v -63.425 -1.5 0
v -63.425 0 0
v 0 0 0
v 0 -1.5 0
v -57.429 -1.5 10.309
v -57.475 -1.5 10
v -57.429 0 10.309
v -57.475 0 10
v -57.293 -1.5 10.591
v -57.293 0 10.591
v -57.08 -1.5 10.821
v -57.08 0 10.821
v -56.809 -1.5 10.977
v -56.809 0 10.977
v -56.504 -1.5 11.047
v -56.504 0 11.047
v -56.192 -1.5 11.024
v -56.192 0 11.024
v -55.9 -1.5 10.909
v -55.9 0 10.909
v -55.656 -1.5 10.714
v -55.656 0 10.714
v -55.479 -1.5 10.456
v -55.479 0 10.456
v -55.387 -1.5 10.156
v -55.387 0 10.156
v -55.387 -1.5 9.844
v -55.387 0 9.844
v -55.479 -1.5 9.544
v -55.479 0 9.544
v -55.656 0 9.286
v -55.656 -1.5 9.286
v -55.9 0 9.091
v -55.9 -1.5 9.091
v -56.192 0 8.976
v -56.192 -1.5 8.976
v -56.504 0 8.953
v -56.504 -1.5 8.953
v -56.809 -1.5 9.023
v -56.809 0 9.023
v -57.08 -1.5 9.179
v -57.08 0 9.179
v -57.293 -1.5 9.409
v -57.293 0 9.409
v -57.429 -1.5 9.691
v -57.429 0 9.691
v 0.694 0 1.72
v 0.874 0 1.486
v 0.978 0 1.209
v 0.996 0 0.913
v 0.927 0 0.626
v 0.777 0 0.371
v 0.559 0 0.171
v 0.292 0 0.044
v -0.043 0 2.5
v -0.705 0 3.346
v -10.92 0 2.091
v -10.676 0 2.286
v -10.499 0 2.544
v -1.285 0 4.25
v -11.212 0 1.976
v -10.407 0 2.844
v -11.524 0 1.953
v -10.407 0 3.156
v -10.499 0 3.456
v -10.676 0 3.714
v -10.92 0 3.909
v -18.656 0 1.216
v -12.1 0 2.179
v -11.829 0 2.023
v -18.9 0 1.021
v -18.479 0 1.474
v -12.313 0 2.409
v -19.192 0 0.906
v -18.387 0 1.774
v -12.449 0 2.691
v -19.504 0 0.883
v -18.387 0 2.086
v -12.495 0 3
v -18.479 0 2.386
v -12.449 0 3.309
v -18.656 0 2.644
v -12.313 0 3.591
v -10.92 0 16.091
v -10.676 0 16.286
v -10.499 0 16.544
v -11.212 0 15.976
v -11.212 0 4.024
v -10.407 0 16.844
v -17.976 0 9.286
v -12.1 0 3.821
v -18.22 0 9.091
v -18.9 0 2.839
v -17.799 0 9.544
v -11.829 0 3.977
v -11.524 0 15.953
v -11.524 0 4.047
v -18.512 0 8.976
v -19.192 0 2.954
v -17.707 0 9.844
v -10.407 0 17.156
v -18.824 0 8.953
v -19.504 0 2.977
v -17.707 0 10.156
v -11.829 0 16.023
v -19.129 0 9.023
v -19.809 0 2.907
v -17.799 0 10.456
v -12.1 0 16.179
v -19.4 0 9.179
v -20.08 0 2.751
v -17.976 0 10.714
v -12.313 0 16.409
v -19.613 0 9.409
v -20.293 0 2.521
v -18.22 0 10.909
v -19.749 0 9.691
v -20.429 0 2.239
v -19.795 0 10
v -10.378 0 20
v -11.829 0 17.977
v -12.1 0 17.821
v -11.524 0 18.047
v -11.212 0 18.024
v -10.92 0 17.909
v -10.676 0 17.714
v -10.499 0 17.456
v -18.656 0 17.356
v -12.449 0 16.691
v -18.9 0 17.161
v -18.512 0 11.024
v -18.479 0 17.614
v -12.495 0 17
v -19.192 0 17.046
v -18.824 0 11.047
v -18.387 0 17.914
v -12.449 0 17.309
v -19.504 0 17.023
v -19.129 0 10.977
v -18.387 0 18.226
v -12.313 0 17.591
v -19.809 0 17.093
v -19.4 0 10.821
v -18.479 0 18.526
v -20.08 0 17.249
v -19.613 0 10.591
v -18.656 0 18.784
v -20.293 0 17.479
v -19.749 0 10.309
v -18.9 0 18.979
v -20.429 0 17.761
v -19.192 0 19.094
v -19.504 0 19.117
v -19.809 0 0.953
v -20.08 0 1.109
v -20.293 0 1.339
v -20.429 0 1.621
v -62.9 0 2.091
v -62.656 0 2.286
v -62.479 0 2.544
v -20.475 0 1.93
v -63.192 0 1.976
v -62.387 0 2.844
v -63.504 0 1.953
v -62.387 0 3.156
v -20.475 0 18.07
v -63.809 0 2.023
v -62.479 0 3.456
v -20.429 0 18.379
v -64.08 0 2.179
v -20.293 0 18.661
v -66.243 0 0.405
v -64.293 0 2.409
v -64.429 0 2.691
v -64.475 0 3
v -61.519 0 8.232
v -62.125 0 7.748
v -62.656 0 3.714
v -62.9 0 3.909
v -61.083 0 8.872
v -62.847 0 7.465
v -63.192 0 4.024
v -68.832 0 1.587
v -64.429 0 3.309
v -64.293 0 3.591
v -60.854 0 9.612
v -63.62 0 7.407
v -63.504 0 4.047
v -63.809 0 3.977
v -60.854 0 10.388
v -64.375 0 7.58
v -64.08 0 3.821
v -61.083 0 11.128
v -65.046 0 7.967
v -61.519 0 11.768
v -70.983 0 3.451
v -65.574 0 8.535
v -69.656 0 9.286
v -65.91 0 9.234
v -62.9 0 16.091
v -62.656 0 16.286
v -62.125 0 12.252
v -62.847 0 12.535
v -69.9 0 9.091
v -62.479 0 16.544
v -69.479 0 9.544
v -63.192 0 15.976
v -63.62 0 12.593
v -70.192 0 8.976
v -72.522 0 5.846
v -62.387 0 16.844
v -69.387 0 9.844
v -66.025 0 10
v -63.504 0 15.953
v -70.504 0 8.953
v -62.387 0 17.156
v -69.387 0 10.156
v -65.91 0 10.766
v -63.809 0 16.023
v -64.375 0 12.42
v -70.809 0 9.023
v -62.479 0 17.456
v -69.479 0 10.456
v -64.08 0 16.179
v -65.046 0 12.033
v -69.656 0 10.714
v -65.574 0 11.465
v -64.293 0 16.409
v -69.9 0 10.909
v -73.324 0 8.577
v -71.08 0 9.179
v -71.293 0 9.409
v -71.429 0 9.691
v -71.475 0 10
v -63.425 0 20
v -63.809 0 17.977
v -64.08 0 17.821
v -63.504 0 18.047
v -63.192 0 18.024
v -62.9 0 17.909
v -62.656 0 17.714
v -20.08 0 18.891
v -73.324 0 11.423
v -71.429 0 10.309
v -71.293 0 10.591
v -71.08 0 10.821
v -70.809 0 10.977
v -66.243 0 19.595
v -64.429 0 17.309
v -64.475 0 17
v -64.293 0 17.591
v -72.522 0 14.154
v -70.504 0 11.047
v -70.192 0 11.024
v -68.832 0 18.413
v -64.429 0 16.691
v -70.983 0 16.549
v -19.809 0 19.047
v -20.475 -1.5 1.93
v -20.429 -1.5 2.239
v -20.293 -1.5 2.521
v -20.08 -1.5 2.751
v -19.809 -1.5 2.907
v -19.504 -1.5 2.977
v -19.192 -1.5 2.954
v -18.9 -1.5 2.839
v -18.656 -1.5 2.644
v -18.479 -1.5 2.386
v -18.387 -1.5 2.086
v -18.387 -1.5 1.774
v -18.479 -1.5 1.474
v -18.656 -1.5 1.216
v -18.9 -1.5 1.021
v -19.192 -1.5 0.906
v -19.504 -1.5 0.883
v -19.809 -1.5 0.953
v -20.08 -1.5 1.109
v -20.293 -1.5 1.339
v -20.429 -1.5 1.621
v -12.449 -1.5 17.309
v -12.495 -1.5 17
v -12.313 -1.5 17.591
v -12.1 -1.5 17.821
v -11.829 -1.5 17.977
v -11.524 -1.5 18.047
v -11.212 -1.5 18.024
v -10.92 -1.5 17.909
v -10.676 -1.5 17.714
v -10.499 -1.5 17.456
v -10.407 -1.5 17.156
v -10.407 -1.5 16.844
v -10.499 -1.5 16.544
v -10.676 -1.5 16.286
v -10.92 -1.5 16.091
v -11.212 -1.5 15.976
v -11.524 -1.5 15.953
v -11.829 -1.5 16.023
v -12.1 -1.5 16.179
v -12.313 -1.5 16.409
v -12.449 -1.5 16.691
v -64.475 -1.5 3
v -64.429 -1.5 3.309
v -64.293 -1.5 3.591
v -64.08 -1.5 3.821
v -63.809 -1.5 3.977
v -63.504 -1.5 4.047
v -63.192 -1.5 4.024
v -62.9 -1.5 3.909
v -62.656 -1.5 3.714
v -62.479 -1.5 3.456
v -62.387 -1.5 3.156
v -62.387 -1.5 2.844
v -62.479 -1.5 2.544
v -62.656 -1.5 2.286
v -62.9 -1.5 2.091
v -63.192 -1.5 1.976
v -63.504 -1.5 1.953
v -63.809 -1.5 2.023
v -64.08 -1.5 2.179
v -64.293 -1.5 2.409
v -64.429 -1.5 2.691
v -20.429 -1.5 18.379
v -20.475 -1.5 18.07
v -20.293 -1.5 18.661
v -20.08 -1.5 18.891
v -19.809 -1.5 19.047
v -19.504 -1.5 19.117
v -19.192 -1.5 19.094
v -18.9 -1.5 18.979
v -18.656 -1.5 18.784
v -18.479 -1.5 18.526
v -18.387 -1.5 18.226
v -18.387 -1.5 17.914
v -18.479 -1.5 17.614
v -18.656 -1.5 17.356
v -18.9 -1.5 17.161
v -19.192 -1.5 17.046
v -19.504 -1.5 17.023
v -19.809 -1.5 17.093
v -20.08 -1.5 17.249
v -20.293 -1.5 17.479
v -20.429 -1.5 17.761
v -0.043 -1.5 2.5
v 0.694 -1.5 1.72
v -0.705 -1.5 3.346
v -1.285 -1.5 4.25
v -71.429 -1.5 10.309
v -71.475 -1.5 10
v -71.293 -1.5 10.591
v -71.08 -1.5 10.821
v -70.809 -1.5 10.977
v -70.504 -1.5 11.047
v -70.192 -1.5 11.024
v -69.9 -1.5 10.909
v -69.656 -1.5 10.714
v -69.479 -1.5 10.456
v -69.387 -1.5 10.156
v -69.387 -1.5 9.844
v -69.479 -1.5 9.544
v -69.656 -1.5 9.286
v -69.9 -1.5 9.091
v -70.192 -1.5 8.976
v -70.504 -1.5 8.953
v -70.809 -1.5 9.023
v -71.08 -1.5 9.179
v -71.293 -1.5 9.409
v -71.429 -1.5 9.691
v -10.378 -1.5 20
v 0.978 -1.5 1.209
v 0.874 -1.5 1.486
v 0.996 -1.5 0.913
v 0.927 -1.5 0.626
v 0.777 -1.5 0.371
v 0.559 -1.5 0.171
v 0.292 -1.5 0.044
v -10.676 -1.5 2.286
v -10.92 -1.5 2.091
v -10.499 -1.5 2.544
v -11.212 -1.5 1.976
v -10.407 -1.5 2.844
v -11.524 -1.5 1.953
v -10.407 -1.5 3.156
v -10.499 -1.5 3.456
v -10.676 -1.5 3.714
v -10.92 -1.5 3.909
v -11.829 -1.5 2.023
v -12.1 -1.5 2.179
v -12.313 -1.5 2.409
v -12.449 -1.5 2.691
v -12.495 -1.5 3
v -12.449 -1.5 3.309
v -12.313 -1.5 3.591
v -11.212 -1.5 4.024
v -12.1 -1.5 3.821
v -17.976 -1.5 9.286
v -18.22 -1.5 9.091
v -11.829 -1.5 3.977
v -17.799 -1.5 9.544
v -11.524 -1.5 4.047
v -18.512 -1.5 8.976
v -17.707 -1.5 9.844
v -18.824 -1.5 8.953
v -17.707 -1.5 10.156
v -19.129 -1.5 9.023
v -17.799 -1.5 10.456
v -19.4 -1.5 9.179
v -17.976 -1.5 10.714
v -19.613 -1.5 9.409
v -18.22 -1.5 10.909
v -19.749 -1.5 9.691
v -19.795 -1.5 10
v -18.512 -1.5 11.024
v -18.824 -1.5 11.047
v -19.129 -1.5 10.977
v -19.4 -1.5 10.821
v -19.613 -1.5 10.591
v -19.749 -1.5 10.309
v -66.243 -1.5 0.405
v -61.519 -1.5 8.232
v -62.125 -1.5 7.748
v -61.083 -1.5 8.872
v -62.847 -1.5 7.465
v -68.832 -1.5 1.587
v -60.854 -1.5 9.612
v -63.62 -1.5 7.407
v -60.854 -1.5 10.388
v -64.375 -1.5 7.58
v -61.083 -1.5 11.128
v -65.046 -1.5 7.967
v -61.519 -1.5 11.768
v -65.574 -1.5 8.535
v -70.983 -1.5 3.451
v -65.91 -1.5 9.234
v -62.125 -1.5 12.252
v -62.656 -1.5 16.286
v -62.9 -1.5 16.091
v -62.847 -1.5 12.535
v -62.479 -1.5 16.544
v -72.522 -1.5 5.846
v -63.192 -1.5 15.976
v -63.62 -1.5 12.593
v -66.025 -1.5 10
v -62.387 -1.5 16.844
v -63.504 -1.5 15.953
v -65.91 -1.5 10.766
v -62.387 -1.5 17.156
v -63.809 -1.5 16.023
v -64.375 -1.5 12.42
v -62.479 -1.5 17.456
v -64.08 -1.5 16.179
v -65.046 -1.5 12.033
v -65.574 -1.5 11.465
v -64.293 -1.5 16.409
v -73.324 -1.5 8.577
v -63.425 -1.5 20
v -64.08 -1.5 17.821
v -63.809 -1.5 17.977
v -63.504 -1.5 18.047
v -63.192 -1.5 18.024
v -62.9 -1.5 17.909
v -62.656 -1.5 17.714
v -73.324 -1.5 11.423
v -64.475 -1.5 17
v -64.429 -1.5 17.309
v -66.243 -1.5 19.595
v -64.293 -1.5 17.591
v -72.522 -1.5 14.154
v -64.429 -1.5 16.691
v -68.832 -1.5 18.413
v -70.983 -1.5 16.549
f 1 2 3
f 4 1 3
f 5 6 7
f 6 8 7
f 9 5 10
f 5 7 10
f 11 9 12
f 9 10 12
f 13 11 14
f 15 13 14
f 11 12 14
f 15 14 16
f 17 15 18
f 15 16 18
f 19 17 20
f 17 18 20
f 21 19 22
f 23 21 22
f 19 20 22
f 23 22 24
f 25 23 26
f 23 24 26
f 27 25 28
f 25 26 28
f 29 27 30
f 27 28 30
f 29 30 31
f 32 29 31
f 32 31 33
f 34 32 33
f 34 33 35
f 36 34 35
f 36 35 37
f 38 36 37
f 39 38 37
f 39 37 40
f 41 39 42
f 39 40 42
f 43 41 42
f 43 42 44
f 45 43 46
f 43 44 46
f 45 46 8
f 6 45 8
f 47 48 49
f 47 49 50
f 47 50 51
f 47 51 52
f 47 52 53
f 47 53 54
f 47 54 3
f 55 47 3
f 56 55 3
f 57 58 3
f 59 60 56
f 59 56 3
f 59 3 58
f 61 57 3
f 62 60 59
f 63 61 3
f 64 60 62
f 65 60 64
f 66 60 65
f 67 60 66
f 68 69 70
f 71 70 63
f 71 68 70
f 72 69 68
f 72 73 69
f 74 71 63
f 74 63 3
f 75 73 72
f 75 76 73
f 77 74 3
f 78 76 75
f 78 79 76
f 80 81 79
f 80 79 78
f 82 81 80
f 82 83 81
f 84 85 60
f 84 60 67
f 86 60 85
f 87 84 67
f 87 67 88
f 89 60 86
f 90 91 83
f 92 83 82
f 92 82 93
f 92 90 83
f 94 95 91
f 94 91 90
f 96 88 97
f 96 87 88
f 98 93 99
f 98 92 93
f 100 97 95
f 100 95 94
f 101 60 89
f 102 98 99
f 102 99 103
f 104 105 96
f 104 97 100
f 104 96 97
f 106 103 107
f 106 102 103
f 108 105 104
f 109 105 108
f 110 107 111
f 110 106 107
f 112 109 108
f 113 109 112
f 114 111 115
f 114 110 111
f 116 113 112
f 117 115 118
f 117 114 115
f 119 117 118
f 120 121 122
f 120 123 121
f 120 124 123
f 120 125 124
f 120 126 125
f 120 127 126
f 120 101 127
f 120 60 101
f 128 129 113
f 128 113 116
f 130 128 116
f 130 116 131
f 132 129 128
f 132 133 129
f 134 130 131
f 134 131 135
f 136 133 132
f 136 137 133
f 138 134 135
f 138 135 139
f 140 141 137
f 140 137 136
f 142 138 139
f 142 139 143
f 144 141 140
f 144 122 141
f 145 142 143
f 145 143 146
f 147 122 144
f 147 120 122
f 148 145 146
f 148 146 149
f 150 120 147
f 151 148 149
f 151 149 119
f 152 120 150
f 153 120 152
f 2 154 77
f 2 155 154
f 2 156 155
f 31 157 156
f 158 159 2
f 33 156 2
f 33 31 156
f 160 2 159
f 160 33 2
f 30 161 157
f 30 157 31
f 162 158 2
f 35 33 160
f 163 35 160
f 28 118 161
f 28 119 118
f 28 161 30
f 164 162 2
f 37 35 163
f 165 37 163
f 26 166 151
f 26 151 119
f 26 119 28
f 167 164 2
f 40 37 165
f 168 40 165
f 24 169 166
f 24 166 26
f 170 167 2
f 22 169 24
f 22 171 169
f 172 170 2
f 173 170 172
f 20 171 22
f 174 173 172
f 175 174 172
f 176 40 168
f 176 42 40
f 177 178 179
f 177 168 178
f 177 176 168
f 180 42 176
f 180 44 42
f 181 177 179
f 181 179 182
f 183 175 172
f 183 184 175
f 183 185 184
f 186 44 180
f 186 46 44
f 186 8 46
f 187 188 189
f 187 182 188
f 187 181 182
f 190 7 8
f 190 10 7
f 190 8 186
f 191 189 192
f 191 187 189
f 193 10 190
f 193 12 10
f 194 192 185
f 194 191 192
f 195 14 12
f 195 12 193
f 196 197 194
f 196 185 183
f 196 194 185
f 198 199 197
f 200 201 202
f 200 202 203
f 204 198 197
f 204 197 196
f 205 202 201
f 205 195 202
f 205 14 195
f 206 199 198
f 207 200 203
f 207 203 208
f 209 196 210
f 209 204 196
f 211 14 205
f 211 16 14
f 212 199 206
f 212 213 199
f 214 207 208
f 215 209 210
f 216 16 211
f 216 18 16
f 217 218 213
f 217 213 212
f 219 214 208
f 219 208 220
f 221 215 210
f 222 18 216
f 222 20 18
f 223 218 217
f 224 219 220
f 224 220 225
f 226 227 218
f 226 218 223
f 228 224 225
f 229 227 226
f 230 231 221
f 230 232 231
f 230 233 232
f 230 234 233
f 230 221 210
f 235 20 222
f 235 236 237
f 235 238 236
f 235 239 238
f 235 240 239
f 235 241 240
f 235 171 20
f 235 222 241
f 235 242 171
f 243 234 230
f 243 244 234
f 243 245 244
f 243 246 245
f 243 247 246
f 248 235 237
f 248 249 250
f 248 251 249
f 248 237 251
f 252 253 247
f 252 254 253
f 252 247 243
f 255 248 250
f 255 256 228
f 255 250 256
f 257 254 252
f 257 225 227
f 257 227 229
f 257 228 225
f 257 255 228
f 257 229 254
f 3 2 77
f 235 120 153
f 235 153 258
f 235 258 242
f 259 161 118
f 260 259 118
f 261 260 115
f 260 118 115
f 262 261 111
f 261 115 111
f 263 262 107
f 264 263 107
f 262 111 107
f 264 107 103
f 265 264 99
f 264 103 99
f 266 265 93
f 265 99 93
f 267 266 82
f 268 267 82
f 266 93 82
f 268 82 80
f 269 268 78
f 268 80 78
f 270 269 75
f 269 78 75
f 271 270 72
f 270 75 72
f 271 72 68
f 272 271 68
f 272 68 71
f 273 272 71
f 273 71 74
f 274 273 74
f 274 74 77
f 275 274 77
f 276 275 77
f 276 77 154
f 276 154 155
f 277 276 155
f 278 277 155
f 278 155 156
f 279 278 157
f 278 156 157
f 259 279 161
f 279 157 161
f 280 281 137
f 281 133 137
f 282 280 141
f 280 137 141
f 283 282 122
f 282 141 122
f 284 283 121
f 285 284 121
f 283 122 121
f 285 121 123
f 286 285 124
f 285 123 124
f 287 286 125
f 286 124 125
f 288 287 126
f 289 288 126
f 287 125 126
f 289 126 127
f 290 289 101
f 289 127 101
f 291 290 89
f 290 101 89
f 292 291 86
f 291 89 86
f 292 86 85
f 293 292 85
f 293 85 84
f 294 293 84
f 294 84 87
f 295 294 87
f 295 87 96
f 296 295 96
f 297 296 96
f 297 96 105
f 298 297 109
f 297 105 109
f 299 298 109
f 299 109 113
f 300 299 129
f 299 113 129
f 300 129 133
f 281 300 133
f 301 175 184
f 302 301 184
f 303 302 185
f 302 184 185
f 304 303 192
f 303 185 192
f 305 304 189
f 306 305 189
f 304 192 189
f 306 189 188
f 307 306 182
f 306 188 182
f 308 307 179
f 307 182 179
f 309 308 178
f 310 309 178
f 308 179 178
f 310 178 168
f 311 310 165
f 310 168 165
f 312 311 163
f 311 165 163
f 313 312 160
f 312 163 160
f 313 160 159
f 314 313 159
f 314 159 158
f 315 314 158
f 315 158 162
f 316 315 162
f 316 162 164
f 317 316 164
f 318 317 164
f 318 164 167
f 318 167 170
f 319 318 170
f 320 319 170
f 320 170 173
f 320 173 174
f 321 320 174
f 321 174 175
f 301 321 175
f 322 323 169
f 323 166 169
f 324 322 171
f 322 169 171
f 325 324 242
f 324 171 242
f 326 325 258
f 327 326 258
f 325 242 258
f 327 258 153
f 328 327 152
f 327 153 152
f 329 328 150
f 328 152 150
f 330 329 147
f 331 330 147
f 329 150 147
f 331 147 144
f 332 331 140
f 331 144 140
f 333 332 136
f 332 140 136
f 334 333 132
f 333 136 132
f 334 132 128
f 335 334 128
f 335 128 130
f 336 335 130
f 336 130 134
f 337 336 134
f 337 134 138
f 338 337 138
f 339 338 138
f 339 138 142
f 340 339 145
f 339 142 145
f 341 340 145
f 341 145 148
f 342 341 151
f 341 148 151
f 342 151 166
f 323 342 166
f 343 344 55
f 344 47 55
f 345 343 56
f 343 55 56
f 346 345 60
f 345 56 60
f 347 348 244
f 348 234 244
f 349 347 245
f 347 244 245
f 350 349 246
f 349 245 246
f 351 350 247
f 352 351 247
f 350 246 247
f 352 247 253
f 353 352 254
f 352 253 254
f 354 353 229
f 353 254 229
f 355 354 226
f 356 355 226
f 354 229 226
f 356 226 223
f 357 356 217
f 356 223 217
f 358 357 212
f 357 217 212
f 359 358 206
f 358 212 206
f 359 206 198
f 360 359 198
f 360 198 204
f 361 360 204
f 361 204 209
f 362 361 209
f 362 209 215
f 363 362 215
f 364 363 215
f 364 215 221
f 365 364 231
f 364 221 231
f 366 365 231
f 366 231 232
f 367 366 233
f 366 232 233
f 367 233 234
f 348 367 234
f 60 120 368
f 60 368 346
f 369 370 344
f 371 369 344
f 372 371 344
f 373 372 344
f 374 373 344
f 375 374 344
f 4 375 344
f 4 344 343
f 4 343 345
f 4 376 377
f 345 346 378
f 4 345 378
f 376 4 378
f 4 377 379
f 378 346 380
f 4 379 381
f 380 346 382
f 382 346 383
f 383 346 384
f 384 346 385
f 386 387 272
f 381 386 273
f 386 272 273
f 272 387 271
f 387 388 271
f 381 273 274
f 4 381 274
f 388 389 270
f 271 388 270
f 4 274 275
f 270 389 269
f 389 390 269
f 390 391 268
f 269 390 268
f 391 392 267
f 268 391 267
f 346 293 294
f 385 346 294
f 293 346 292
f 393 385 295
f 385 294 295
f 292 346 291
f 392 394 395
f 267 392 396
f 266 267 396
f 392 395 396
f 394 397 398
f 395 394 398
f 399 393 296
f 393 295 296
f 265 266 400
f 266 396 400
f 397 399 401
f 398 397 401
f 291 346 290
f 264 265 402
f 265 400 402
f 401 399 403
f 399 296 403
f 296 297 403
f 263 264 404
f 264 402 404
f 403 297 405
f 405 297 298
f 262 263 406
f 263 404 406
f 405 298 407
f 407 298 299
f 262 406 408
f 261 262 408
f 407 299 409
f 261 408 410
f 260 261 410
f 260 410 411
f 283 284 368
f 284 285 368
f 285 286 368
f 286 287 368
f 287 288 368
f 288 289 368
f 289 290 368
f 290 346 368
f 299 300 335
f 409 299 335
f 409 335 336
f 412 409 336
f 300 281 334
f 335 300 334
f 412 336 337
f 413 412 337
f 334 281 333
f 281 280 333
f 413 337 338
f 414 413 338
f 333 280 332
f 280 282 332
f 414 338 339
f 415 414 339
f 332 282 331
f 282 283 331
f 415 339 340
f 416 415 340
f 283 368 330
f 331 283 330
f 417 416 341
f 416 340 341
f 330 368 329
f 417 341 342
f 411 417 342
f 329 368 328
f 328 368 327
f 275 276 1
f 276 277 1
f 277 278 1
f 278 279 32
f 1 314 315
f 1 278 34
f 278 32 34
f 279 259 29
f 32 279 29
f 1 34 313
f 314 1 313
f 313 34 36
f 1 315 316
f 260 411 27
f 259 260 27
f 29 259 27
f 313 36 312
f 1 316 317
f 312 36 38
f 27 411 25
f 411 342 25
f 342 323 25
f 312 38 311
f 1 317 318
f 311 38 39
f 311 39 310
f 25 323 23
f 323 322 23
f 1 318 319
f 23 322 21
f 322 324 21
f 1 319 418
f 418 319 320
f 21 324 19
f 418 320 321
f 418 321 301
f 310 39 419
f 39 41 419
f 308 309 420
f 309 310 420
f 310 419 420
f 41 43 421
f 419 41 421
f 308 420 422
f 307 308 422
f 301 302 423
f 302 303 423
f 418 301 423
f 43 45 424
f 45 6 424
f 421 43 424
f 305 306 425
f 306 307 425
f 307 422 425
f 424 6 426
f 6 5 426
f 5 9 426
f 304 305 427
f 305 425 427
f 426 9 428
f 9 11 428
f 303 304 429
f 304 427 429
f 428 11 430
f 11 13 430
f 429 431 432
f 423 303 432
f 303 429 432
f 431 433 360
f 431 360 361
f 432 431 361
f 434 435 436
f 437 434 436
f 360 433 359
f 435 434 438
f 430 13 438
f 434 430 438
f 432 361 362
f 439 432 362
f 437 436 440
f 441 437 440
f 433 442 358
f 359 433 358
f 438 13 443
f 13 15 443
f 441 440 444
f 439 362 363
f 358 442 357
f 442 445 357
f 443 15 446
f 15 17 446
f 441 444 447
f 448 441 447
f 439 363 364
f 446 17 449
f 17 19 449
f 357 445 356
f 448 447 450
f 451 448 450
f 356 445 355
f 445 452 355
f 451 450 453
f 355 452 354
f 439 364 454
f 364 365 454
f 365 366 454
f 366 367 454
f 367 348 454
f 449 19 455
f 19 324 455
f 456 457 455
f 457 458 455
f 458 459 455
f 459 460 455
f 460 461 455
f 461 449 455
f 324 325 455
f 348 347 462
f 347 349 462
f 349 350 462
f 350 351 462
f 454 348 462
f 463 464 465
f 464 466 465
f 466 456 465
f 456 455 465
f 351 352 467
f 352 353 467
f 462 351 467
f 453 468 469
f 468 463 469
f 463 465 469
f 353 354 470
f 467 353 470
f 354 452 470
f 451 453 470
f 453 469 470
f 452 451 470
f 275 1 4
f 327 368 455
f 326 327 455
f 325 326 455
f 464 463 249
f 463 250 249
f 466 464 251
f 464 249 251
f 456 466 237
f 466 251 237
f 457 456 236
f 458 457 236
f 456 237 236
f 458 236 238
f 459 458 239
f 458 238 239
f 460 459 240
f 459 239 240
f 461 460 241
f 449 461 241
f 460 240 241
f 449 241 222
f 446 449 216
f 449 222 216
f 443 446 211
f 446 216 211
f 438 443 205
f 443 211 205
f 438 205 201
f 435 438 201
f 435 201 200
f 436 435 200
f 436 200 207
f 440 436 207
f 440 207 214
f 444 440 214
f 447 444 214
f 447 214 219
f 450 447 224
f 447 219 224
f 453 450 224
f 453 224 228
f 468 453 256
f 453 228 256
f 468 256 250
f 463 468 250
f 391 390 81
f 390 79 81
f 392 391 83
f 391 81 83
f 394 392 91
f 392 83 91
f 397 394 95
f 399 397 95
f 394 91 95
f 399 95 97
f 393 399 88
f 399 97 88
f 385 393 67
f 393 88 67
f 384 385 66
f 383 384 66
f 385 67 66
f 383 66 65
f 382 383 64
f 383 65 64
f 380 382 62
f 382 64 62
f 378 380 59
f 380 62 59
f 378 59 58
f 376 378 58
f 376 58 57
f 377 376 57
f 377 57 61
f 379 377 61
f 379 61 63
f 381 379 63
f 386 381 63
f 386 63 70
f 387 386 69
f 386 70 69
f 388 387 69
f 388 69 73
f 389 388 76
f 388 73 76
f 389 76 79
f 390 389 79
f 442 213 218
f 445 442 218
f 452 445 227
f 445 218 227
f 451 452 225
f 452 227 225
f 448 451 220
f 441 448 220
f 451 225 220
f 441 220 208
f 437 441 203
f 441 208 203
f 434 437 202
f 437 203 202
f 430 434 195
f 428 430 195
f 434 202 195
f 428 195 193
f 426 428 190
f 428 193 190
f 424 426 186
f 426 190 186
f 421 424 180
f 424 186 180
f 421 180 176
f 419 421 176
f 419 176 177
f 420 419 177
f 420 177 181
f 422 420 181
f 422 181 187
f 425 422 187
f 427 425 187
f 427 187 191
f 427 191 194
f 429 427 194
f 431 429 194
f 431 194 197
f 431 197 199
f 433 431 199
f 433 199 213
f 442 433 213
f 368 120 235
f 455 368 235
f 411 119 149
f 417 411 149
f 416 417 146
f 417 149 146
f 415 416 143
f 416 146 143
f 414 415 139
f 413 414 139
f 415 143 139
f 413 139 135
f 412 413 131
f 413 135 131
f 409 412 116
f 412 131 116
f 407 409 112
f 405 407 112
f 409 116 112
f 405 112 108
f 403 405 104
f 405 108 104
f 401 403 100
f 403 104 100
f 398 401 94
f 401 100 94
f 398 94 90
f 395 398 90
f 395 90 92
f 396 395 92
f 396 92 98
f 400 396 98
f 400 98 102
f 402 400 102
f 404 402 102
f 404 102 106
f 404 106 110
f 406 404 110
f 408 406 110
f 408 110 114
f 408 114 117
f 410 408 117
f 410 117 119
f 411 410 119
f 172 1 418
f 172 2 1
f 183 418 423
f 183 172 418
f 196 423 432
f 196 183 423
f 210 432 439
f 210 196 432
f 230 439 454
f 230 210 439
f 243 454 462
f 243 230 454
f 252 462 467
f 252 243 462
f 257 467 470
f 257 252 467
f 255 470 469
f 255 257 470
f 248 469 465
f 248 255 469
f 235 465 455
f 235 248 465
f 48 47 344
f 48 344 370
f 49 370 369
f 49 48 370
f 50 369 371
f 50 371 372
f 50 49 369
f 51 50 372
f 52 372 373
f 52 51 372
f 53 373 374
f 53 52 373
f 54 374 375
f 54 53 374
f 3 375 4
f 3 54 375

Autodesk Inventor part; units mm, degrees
ref_plane "YZ Plane" through (0, 0, 0) normal (1, 0, 0) x (0, 1, 0)
ref_plane "XZ Plane" through (0, 0, 0) normal (0, 1, 0) x (-1, 0, 0)
ref_plane "XY Plane" through (0, 0, 0) normal (0, 0, 1) x (1, 0, 0)
sketch "Sketch1" plane through (0, 0, 0) normal (0, 1, 0) x (-1, 0, 0)
  circle A0 centre (19.4253, 18.07) radius 1.05
  circle A1 centre (11.4453, 17) radius 1.05
  circle A2 centre (18.7453, 10) radius 1.05
  circle A3 centre (11.4453, 3) radius 1.05
  circle A4 centre (19.4253, 1.93) radius 1.05
  circle A5 centre (63.4253, 10) radius 2.6
  circle A6 centre (63.4253, 17) radius 1.05
  circle A7 centre (56.4253, 10) radius 1.05
  circle A8 centre (63.4253, 3) radius 1.05
  circle A9 centre (70.4253, 10) radius 1.05
  line L0 (10.3779, 20) -> (1.2846, 4.25)
  arc A10 (-0.694, 1.72) -> (1.2846, 4.25) centre (-8.6747, 10) ccw
  arc A11 (-0.694, 1.72) -> (0, 0) centre (0, 1) ccw
  line L1 (63.4253, 0) -> (0, 0)
  arc A12 (63.4253, 0) -> (63.4253, 20) centre (63.4253, 10) ccw
  line L2 (10.3779, 20) -> (63.4253, 20)
  point P0 (0, 0)
extrude "Extrusion1" add sketch "Sketch1" against normal blind 1.5
properties part number "CAM_axis_2_4_connector_frame_powered"
